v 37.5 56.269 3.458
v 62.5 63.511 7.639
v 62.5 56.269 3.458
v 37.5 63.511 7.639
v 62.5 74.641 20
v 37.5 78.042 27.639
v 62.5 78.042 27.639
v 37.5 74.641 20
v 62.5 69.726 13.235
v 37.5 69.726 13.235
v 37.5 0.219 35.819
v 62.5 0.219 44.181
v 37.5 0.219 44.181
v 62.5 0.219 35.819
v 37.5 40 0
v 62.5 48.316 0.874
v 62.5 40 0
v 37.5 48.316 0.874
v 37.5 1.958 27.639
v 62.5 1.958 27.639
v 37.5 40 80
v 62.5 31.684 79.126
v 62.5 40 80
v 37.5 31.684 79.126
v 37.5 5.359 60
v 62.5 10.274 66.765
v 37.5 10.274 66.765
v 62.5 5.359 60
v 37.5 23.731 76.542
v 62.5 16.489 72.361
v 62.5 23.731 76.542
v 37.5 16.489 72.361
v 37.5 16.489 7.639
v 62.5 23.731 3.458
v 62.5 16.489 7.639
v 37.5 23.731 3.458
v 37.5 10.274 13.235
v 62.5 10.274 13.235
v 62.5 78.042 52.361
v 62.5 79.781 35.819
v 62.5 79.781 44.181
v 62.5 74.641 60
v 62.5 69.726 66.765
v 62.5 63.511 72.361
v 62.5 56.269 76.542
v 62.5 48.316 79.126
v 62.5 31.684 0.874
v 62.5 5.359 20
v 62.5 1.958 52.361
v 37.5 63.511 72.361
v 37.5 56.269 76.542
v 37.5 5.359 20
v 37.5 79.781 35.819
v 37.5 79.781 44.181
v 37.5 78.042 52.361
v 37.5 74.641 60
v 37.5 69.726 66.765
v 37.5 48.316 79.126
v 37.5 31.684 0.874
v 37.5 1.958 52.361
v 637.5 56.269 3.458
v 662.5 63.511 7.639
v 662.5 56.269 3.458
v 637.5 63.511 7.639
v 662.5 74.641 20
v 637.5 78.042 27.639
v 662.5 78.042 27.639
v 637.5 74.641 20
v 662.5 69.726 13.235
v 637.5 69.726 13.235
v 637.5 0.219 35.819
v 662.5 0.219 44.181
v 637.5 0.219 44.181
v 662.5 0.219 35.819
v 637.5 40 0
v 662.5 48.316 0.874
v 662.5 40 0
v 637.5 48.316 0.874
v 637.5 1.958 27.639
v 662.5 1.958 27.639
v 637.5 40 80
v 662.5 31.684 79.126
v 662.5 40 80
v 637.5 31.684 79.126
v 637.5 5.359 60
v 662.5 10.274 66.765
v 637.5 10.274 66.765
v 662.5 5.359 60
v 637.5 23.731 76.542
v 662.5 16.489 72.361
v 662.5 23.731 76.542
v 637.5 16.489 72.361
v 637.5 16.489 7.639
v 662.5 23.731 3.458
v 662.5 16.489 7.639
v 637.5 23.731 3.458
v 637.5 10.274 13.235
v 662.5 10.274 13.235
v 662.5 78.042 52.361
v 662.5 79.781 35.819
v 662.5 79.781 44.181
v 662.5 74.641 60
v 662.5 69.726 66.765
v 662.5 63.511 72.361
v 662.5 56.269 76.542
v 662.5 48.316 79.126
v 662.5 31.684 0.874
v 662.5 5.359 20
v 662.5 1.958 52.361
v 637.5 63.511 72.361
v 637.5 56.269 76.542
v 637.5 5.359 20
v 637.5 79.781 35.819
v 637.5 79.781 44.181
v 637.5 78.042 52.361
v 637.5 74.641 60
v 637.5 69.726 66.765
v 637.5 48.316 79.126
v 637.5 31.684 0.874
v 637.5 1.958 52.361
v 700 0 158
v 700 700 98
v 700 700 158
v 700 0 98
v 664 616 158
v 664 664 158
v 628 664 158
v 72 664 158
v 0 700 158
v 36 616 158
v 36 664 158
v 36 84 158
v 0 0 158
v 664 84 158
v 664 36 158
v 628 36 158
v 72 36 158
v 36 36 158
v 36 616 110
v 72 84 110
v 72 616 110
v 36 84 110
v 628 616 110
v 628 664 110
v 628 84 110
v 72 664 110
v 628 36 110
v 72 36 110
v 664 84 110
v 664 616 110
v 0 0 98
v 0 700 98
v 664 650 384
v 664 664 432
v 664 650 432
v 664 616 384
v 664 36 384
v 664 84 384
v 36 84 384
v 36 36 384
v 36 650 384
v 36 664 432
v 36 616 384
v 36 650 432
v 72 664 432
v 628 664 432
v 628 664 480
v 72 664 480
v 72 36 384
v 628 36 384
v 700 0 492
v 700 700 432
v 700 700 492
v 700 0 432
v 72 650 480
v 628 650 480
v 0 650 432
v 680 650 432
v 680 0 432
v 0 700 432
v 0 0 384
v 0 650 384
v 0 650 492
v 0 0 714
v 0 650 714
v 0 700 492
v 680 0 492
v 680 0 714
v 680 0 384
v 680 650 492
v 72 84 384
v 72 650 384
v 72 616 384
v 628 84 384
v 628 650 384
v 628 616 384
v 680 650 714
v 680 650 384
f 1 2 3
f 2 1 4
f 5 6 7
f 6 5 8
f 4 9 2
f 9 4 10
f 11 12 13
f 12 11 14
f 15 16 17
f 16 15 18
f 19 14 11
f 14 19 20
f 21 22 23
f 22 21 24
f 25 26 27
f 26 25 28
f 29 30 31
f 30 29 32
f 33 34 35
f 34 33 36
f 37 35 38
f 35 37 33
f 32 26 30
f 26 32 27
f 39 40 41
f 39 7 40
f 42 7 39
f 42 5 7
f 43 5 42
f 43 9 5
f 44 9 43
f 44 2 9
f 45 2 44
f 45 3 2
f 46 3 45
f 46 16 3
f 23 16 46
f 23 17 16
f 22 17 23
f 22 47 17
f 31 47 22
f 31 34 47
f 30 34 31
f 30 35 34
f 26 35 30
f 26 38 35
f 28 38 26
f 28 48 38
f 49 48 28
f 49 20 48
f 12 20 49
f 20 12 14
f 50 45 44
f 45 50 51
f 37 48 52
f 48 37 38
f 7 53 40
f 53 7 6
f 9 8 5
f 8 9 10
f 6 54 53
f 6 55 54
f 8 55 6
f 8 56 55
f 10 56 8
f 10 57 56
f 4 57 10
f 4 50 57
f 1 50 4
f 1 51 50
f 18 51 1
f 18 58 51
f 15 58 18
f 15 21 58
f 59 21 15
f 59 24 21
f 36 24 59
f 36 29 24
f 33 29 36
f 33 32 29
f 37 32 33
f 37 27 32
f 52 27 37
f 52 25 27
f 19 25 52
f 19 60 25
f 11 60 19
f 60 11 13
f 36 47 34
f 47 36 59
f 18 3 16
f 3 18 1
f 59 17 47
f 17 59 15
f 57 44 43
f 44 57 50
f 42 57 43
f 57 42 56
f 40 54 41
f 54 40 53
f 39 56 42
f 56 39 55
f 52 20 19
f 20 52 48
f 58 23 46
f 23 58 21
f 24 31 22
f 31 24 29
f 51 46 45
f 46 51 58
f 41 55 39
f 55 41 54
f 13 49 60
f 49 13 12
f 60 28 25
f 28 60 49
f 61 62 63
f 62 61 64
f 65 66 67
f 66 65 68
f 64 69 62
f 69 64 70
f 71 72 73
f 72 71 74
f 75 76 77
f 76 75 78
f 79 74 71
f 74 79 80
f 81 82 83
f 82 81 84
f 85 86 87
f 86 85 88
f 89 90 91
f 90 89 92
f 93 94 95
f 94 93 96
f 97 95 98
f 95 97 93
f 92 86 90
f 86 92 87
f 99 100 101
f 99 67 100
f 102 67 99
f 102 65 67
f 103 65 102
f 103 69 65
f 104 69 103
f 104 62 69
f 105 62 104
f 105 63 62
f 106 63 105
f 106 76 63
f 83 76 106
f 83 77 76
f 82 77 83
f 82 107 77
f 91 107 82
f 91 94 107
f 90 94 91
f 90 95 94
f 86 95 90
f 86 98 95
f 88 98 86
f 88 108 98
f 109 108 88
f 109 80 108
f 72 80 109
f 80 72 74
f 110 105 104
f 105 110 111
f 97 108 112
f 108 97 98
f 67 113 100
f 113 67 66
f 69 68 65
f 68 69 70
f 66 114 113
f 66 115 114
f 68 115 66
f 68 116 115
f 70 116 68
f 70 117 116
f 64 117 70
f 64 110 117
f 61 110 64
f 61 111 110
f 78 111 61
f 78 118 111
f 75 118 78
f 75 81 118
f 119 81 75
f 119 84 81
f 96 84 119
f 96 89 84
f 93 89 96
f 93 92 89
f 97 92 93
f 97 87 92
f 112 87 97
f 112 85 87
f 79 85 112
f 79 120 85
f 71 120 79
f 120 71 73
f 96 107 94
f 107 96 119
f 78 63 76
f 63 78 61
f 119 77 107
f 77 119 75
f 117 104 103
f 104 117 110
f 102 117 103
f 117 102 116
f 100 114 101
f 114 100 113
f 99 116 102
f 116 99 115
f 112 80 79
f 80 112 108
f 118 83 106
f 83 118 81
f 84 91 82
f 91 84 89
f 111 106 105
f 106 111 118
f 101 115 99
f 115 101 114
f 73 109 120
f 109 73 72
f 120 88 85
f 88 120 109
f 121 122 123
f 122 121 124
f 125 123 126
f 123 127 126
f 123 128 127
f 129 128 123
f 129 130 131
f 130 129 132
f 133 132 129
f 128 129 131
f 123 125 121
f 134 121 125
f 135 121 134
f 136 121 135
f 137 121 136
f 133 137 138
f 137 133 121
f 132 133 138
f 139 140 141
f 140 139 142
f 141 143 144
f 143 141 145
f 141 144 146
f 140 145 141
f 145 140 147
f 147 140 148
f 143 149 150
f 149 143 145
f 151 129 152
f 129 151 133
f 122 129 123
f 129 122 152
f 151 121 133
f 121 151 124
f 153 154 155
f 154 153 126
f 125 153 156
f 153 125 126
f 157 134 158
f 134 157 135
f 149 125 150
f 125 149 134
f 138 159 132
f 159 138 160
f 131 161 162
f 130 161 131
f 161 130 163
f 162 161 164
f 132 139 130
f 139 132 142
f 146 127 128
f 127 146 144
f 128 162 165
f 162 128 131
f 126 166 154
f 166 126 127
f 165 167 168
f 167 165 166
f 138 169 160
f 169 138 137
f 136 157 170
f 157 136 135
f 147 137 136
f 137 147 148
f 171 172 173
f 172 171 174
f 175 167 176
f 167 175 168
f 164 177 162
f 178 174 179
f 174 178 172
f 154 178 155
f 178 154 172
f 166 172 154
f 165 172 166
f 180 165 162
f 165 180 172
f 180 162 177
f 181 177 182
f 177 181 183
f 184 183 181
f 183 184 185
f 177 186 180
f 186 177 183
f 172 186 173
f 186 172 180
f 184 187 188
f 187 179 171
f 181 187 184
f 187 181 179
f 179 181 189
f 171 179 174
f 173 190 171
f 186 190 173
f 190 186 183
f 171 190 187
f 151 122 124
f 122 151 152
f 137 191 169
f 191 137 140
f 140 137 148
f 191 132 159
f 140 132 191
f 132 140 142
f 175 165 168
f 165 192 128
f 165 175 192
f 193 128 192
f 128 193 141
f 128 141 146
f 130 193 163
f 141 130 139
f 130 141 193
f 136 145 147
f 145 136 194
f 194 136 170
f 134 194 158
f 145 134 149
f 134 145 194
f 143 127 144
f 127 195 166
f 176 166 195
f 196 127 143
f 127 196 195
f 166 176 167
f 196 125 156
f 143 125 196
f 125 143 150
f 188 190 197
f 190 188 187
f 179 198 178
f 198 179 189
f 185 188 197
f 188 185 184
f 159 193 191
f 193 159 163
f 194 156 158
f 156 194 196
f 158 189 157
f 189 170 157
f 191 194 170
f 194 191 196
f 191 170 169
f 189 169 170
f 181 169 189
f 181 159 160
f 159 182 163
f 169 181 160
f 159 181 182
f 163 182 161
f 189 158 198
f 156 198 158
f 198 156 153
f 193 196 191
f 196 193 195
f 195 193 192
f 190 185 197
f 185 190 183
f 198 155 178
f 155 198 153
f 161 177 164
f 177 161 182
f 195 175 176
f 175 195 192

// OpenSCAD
// 700 x 700

//Stender dim
s_b = 36;
s_h = 48;
s_l = 700;


frame_2_frame_h = 370;

//Finer plate topp og bunn tykkelse
top_mat_t=12;

wheel_h=110;

module dewalt_7492(){
    
    h=330;
    b=680;
    d=650;
   
    cube([b,d,h]);
}


module frame(){
    color("BurlyWood") {
    difference([]){
        cube([s_l, s_l, s_h]);
        translate([s_b, s_b, -1]){
            cube([s_l-2*s_b, s_l-2*s_b, s_h+2]);
        }
    }
}
}

module support(){
    cube([s_b, s_h, frame_2_frame_h]);
}


module box(){

    //top frame
    translate([0,0,frame_2_frame_h-s_h]){
        frame();
    }

    //bottom frame
    frame();


    //Supports
    translate([s_b, s_b,0]) support();
    translate([s_b, s_l-s_b-s_h,0]) support();
    translate([s_l-2*s_b, s_b,0]) support();
    translate([s_l-2*s_b, s_l-s_b-s_h,0]) support();

    //Finer tables
    //Top
    color("Gold", 0.3){
    translate([0,0, frame_2_frame_h]){
        cube([s_l, s_l, top_mat_t]);
    }
    //bottom
    translate([0,0, -top_mat_t]){
    cube([s_l, s_l, top_mat_t]);
    }
    }
}


module wheel(){
translate([50,80/2,80/2]) rotate([0,90,0]) cylinder(h=25,d=80, center=true);
    
    
translate([s_l-50,80/2,80/2]) rotate([0,90,0]) cylinder(h=25,d=80, center=true);
}

wheel();

translate([0,0,wheel_h]){
    box();
}

translate([0,0,frame_2_frame_h+top_mat_t+2]) dewalt_7492();
